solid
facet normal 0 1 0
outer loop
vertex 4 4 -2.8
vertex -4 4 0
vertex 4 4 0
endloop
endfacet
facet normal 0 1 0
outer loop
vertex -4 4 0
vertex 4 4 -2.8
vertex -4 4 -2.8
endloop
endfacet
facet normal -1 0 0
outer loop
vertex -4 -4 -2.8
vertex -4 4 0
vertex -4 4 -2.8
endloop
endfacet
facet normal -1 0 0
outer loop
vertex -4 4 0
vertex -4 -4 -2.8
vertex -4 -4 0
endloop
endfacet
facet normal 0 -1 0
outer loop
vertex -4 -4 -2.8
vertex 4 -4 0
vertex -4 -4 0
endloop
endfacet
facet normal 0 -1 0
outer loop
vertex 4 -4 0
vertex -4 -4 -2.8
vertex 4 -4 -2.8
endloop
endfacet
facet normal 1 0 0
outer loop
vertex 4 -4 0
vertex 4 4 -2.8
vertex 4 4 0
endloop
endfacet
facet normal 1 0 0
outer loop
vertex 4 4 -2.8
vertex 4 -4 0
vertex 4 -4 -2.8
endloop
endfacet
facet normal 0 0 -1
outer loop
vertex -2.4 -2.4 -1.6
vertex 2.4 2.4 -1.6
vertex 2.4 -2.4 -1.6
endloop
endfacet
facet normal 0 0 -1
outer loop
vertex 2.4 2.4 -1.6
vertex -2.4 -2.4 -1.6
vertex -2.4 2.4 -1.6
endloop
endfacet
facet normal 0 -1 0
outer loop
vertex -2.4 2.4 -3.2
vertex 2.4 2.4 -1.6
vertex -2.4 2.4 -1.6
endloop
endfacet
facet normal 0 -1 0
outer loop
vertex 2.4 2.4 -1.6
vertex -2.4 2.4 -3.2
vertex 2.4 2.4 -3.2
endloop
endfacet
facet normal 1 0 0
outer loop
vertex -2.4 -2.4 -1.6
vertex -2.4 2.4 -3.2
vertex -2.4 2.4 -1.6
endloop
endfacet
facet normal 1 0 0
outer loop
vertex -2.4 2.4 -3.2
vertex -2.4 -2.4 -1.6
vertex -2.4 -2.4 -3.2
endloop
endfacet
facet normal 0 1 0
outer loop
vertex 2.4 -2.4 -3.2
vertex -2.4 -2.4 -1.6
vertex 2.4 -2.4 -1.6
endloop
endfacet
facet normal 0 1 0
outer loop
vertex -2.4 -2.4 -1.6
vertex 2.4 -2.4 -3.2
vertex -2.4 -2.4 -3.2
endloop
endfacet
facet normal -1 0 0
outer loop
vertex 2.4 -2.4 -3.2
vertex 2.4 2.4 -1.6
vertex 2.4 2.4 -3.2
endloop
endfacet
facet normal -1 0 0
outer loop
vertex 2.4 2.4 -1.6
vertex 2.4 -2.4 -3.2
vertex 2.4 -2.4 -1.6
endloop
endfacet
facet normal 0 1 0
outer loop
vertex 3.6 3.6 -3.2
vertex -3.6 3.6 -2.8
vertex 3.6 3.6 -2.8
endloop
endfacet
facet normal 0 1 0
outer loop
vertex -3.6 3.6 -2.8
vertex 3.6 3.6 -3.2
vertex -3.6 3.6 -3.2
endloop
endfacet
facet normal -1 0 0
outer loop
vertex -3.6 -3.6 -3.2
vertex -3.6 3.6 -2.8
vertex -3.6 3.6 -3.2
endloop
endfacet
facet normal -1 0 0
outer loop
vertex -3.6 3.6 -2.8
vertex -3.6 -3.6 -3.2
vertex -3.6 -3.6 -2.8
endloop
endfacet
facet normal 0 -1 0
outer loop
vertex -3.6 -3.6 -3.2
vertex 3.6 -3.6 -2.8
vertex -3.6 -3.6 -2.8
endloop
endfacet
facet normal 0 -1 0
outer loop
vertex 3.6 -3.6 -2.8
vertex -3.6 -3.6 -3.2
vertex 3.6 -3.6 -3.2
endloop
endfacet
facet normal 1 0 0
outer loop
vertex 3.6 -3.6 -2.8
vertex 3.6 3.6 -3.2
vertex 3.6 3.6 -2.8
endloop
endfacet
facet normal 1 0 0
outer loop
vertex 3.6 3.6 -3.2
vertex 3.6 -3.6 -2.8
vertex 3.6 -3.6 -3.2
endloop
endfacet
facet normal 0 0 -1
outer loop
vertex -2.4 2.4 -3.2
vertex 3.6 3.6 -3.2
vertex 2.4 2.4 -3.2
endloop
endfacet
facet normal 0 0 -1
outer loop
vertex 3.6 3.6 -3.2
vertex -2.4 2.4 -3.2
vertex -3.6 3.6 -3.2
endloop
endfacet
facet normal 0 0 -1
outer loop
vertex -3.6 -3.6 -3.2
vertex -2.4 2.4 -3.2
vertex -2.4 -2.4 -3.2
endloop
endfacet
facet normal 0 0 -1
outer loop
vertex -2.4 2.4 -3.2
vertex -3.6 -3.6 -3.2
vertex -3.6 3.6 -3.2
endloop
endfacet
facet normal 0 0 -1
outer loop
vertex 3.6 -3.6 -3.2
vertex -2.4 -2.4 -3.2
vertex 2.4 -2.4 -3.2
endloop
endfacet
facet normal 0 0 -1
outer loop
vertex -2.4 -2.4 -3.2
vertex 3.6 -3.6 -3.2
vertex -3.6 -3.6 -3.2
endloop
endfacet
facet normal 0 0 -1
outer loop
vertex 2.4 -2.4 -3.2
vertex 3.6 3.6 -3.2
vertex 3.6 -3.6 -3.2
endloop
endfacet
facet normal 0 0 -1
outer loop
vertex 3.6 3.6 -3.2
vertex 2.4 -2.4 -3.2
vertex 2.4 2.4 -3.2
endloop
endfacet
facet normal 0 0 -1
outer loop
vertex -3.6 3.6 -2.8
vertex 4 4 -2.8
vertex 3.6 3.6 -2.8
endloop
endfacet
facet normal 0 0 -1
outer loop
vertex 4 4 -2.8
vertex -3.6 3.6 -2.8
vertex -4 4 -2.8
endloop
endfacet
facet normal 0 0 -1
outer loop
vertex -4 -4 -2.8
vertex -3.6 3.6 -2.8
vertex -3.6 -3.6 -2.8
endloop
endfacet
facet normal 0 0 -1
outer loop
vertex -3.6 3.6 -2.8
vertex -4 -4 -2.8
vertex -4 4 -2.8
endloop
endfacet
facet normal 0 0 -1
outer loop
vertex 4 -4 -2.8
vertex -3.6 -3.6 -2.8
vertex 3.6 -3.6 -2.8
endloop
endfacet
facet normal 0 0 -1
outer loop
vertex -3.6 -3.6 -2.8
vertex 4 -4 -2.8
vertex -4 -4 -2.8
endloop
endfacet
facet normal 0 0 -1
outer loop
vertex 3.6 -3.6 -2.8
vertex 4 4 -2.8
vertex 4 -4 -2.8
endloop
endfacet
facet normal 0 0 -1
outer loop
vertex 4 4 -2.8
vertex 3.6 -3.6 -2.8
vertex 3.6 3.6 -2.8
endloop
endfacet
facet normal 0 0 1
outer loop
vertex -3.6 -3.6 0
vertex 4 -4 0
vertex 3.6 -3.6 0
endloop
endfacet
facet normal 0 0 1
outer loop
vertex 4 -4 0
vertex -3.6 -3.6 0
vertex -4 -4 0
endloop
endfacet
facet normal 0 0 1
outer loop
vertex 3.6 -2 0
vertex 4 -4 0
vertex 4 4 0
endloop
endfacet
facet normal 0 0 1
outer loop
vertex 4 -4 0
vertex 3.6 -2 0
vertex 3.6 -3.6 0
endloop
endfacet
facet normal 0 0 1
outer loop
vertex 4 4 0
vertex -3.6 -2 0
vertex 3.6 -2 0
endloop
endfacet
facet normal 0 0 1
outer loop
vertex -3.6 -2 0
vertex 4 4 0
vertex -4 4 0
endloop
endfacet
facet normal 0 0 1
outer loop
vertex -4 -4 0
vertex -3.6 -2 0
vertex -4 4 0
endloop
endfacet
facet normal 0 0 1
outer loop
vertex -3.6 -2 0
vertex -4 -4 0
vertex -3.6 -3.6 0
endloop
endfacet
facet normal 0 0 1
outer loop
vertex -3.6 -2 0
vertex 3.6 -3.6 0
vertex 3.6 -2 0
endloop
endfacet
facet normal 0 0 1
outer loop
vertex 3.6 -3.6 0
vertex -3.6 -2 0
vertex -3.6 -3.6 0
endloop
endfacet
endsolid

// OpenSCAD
// file: ../p/box5.scad
use <../lib.scad>
function ldraw_lib__box5() = [
// 0 Box with 5 Faces and All Edges
// 0 Name: box5.dat
// 0 Author: James Jessiman
// 0 !LDRAW_ORG Primitive UPDATE 2012-01
// 0 !LICENSE Licensed under CC BY 4.0 : see CAreadme.txt
// 
// 0 BFC CERTIFY CCW
  [0,"BFC","CERTIFY"],
  [0,"BFC","CCW"],
// 
// 0 !HISTORY 2002-04-03 [sbliss] Modified for BFC compliance
// 0 !HISTORY 2002-04-25 [PTadmin] Official Update 2002-02
// 0 !HISTORY 2007-06-24 [PTadmin] Header formatted for Contributor Agreement
// 0 !HISTORY 2008-07-01 [PTadmin] Official Update 2008-01
// 0 !HISTORY 2012-02-16 [Philo] Changed to CCW
// 0 !HISTORY 2012-03-30 [PTadmin] Official Update 2012-01
// 
// 
// 2 24 1 1 1 -1 1 1
  [2,24,1,1,1,-1,1,1],
// 2 24 -1 1 1 -1 1 -1
  [2,24,-1,1,1,-1,1,-1],
// 2 24 -1 1 -1 1 1 -1
  [2,24,-1,1,-1,1,1,-1],
// 2 24 1 1 -1 1 1 1
  [2,24,1,1,-1,1,1,1],
// 2 24 1 0 1 -1 0 1
  [2,24,1,0,1,-1,0,1],
// 2 24 -1 0 1 -1 0 -1
  [2,24,-1,0,1,-1,0,-1],
// 2 24 -1 0 -1 1 0 -1
  [2,24,-1,0,-1,1,0,-1],
// 2 24 1 0 -1 1 0 1
  [2,24,1,0,-1,1,0,1],
// 2 24 1 0 1 1 1 1
  [2,24,1,0,1,1,1,1],
// 2 24 -1 0 1 -1 1 1
  [2,24,-1,0,1,-1,1,1],
// 2 24 1 0 -1 1 1 -1
  [2,24,1,0,-1,1,1,-1],
// 2 24 -1 0 -1 -1 1 -1
  [2,24,-1,0,-1,-1,1,-1],
// 4 16 -1 1 1 1 1 1 1 1 -1 -1 1 -1
  [4,16,-1,1,1,1,1,1,1,1,-1,-1,1,-1],
// 4 16 -1 1 1 -1 0 1 1 0 1 1 1 1
  [4,16,-1,1,1,-1,0,1,1,0,1,1,1,1],
// 4 16 -1 1 -1 -1 0 -1 -1 0 1 -1 1 1
  [4,16,-1,1,-1,-1,0,-1,-1,0,1,-1,1,1],
// 4 16 1 1 -1 1 0 -1 -1 0 -1 -1 1 -1
  [4,16,1,1,-1,1,0,-1,-1,0,-1,-1,1,-1],
// 4 16 1 1 1 1 0 1 1 0 -1 1 1 -1
  [4,16,1,1,1,1,0,1,1,0,-1,1,1,-1],
];
module ldraw_lib__box5(step=0, col=false, unit=2/5, alt=false, line=0.2, solid=!$preview)
    makepoly(ldraw_lib__box5(), step=step, col=col, unit=unit, alt=alt, line=line, solid=solid);
ldraw_lib__box5(line=0.2);
// file: ../p/box4.scad
use <../lib.scad>
function ldraw_lib__box4() = [
// 0 Box with 4 Faces (2 Parallel Pairs) and All Edges
// 0 Name: box4.dat
// 0 Author: James Jessiman
// 0 !LDRAW_ORG Primitive UPDATE 2012-01
// 0 !LICENSE Licensed under CC BY 4.0 : see CAreadme.txt
// 
// 0 BFC CERTIFY CCW
  [0,"BFC","CERTIFY"],
  [0,"BFC","CCW"],
// 
// 0 !HISTORY 2002-04-03 [sbliss] Modified for BFC compliance
// 0 !HISTORY 2002-04-25 [PTadmin] Official Update 2002-02
// 0 !HISTORY 2007-06-24 [PTadmin] Header formatted for Contributor Agreement
// 0 !HISTORY 2008-07-01 [PTadmin] Official Update 2008-01
// 0 !HISTORY 2012-02-16 [Philo] Changed to CCW
// 0 !HISTORY 2012-03-30 [PTadmin] Official Update 2012-01
// 
// 
// 2 24 1 1 1 -1 1 1
  [2,24,1,1,1,-1,1,1],
// 2 24 -1 1 1 -1 1 -1
  [2,24,-1,1,1,-1,1,-1],
// 2 24 -1 1 -1 1 1 -1
  [2,24,-1,1,-1,1,1,-1],
// 2 24 1 1 -1 1 1 1
  [2,24,1,1,-1,1,1,1],
// 2 24 1 0 1 -1 0 1
  [2,24,1,0,1,-1,0,1],
// 2 24 -1 0 1 -1 0 -1
  [2,24,-1,0,1,-1,0,-1],
// 2 24 -1 0 -1 1 0 -1
  [2,24,-1,0,-1,1,0,-1],
// 2 24 1 0 -1 1 0 1
  [2,24,1,0,-1,1,0,1],
// 2 24 1 0 1 1 1 1
  [2,24,1,0,1,1,1,1],
// 2 24 -1 0 1 -1 1 1
  [2,24,-1,0,1,-1,1,1],
// 2 24 1 0 -1 1 1 -1
  [2,24,1,0,-1,1,1,-1],
// 2 24 -1 0 -1 -1 1 -1
  [2,24,-1,0,-1,-1,1,-1],
// 4 16 -1 1 1 -1 0 1 1 0 1 1 1 1
  [4,16,-1,1,1,-1,0,1,1,0,1,1,1,1],
// 4 16 -1 1 -1 -1 0 -1 -1 0 1 -1 1 1
  [4,16,-1,1,-1,-1,0,-1,-1,0,1,-1,1,1],
// 4 16 1 1 -1 1 0 -1 -1 0 -1 -1 1 -1
  [4,16,1,1,-1,1,0,-1,-1,0,-1,-1,1,-1],
// 4 16 1 1 1 1 0 1 1 0 -1 1 1 -1
  [4,16,1,1,1,1,0,1,1,0,-1,1,1,-1],
];
module ldraw_lib__box4(step=0, col=false, unit=2/5, alt=false, line=0.2, solid=!$preview)
    makepoly(ldraw_lib__box4(), step=step, col=col, unit=unit, alt=alt, line=line, solid=solid);
ldraw_lib__box4(line=0.2);
// file: s/3070bs01.scad
use <../../lib.scad>
use <../../p/box4.scad>
use <../../p/box5.scad>
function ldraw_lib__s__3070bs01() = [
// 0 ~Tile  1 x  1 with Groove without Top Face
// 0 Name: s\3070bs01.dat
// 0 Author: Chris Dee [cwdee]
// 0 !LDRAW_ORG Subpart UPDATE 2009-02
// 0 !LICENSE Licensed under CC BY 4.0 : see CAreadme.txt
// 
// 0 BFC CERTIFY CCW
  [0,"BFC","CERTIFY"],
  [0,"BFC","CCW"],
// 
// 0 !HISTORY 2009-09-03 [PTadmin] Official Update 2009-02
// 
// 
// 1 16 0 0 0 10 0 0 0 7 0 0 0 10 box4.dat
  [1,16,0,0,0,10,0,0,0,7,0,0,0,10, ldraw_lib__box4()],
// 0 BFC INVERTNEXT
  [0,"BFC","INVERTNEXT"],
// 1 16 0 8 0 6 0 0 0 -4 0 0 0 6 box5.dat
  [1,16,0,8,0,6,0,0,0,-4,0,0,0,6, ldraw_lib__box5()],
// 1 16 0 7 0 9 0 0 0 1 0 0 0 9 box4.dat
  [1,16,0,7,0,9,0,0,0,1,0,0,0,9, ldraw_lib__box4()],
// 
// 4 16 9 8 9 6 8 6 -6 8 6 -9 8 9
  [4,16,9,8,9,6,8,6,-6,8,6,-9,8,9],
// 4 16 -9 8 9 -6 8 6 -6 8 -6 -9 8 -9
  [4,16,-9,8,9,-6,8,6,-6,8,-6,-9,8,-9],
// 4 16 -9 8 -9 -6 8 -6 6 8 -6 9 8 -9
  [4,16,-9,8,-9,-6,8,-6,6,8,-6,9,8,-9],
// 4 16 9 8 -9 6 8 -6 6 8 6 9 8 9
  [4,16,9,8,-9,6,8,-6,6,8,6,9,8,9],
// 
// 4 16 10 7 10 9 7 9 -9 7 9 -10 7 10
  [4,16,10,7,10,9,7,9,-9,7,9,-10,7,10],
// 4 16 -10 7 10 -9 7 9 -9 7 -9 -10 7 -10
  [4,16,-10,7,10,-9,7,9,-9,7,-9,-10,7,-10],
// 4 16 -10 7 -10 -9 7 -9 9 7 -9 10 7 -10
  [4,16,-10,7,-10,-9,7,-9,9,7,-9,10,7,-10],
// 4 16 10 7 -10 9 7 -9 9 7 9 10 7 10
  [4,16,10,7,-10,9,7,-9,9,7,9,10,7,10],
// 0
];
module ldraw_lib__s__3070bs01(step=0, col=false, unit=2/5, alt=false, line=0.2, solid=!$preview)
    makepoly(ldraw_lib__s__3070bs01(), step=step, col=col, unit=unit, alt=alt, line=line, solid=solid);
ldraw_lib__s__3070bs01(line=0.2);
// main file
use <../lib.scad>
use <s/3070bs01.scad>
function ldraw_lib__3070bp1j() = [
// 0 Tile  1 x  1 with Light Bluish Grey Line Pattern
// 0 Name: 3070bp1j.dat
// 0 Author: Florent Faramond [Makou]
// 0 !LDRAW_ORG Part UPDATE 2025-06
// 0 !LICENSE Licensed under CC BY 4.0 : see CAreadme.txt
// 
// 0 BFC CERTIFY CCW
  [0,"BFC","CERTIFY"],
  [0,"BFC","CCW"],
// 
// 0 !KEYWORDS BrickLink 3070pb167, Controller, NES, Nintendo Entertainment System
// 0 !KEYWORDS Rebrickable 3070bpr0231, Set 71374
// 
// 0 !HISTORY 2025-06-26 [OrionP] Official Update 2025-06
// 
// 1 16 0 0 0 1 0 0 0 1 0 0 0 1 s\3070bs01.dat
  [1,16,0,0,0,1,0,0,0,1,0,0,0,1, ldraw_lib__s__3070bs01()],
// 
// 4 16 9 0 -9 -9 0 -9 -10 0 -10 10 0 -10
  [4,16,9,0,-9,-9,0,-9,-10,0,-10,10,0,-10],
// 4 16 9 0 -5 9 0 -9 10 0 -10 10 0 10
  [4,16,9,0,-5,9,0,-9,10,0,-10,10,0,10],
// 4 16 9 0 -5 10 0 10 -10 0 10 -9 0 -5
  [4,16,9,0,-5,10,0,10,-10,0,10,-9,0,-5],
// 4 16 -10 0 -10 -9 0 -9 -9 0 -5 -10 0 10
  [4,16,-10,0,-10,-9,0,-9,-9,0,-5,-10,0,10],
// 4 71 9 0 -9 9 0 -5 -9 0 -5 -9 0 -9
  [4,71,9,0,-9,9,0,-5,-9,0,-5,-9,0,-9],
];
module ldraw_lib__3070bp1j(step=0, col=false, unit=2/5, alt=false, line=0.2, solid=!$preview)
    makepoly(ldraw_lib__3070bp1j(), step=step, col=col, unit=unit, alt=alt, line=line, solid=solid);
ldraw_lib__3070bp1j(line=0.2);
